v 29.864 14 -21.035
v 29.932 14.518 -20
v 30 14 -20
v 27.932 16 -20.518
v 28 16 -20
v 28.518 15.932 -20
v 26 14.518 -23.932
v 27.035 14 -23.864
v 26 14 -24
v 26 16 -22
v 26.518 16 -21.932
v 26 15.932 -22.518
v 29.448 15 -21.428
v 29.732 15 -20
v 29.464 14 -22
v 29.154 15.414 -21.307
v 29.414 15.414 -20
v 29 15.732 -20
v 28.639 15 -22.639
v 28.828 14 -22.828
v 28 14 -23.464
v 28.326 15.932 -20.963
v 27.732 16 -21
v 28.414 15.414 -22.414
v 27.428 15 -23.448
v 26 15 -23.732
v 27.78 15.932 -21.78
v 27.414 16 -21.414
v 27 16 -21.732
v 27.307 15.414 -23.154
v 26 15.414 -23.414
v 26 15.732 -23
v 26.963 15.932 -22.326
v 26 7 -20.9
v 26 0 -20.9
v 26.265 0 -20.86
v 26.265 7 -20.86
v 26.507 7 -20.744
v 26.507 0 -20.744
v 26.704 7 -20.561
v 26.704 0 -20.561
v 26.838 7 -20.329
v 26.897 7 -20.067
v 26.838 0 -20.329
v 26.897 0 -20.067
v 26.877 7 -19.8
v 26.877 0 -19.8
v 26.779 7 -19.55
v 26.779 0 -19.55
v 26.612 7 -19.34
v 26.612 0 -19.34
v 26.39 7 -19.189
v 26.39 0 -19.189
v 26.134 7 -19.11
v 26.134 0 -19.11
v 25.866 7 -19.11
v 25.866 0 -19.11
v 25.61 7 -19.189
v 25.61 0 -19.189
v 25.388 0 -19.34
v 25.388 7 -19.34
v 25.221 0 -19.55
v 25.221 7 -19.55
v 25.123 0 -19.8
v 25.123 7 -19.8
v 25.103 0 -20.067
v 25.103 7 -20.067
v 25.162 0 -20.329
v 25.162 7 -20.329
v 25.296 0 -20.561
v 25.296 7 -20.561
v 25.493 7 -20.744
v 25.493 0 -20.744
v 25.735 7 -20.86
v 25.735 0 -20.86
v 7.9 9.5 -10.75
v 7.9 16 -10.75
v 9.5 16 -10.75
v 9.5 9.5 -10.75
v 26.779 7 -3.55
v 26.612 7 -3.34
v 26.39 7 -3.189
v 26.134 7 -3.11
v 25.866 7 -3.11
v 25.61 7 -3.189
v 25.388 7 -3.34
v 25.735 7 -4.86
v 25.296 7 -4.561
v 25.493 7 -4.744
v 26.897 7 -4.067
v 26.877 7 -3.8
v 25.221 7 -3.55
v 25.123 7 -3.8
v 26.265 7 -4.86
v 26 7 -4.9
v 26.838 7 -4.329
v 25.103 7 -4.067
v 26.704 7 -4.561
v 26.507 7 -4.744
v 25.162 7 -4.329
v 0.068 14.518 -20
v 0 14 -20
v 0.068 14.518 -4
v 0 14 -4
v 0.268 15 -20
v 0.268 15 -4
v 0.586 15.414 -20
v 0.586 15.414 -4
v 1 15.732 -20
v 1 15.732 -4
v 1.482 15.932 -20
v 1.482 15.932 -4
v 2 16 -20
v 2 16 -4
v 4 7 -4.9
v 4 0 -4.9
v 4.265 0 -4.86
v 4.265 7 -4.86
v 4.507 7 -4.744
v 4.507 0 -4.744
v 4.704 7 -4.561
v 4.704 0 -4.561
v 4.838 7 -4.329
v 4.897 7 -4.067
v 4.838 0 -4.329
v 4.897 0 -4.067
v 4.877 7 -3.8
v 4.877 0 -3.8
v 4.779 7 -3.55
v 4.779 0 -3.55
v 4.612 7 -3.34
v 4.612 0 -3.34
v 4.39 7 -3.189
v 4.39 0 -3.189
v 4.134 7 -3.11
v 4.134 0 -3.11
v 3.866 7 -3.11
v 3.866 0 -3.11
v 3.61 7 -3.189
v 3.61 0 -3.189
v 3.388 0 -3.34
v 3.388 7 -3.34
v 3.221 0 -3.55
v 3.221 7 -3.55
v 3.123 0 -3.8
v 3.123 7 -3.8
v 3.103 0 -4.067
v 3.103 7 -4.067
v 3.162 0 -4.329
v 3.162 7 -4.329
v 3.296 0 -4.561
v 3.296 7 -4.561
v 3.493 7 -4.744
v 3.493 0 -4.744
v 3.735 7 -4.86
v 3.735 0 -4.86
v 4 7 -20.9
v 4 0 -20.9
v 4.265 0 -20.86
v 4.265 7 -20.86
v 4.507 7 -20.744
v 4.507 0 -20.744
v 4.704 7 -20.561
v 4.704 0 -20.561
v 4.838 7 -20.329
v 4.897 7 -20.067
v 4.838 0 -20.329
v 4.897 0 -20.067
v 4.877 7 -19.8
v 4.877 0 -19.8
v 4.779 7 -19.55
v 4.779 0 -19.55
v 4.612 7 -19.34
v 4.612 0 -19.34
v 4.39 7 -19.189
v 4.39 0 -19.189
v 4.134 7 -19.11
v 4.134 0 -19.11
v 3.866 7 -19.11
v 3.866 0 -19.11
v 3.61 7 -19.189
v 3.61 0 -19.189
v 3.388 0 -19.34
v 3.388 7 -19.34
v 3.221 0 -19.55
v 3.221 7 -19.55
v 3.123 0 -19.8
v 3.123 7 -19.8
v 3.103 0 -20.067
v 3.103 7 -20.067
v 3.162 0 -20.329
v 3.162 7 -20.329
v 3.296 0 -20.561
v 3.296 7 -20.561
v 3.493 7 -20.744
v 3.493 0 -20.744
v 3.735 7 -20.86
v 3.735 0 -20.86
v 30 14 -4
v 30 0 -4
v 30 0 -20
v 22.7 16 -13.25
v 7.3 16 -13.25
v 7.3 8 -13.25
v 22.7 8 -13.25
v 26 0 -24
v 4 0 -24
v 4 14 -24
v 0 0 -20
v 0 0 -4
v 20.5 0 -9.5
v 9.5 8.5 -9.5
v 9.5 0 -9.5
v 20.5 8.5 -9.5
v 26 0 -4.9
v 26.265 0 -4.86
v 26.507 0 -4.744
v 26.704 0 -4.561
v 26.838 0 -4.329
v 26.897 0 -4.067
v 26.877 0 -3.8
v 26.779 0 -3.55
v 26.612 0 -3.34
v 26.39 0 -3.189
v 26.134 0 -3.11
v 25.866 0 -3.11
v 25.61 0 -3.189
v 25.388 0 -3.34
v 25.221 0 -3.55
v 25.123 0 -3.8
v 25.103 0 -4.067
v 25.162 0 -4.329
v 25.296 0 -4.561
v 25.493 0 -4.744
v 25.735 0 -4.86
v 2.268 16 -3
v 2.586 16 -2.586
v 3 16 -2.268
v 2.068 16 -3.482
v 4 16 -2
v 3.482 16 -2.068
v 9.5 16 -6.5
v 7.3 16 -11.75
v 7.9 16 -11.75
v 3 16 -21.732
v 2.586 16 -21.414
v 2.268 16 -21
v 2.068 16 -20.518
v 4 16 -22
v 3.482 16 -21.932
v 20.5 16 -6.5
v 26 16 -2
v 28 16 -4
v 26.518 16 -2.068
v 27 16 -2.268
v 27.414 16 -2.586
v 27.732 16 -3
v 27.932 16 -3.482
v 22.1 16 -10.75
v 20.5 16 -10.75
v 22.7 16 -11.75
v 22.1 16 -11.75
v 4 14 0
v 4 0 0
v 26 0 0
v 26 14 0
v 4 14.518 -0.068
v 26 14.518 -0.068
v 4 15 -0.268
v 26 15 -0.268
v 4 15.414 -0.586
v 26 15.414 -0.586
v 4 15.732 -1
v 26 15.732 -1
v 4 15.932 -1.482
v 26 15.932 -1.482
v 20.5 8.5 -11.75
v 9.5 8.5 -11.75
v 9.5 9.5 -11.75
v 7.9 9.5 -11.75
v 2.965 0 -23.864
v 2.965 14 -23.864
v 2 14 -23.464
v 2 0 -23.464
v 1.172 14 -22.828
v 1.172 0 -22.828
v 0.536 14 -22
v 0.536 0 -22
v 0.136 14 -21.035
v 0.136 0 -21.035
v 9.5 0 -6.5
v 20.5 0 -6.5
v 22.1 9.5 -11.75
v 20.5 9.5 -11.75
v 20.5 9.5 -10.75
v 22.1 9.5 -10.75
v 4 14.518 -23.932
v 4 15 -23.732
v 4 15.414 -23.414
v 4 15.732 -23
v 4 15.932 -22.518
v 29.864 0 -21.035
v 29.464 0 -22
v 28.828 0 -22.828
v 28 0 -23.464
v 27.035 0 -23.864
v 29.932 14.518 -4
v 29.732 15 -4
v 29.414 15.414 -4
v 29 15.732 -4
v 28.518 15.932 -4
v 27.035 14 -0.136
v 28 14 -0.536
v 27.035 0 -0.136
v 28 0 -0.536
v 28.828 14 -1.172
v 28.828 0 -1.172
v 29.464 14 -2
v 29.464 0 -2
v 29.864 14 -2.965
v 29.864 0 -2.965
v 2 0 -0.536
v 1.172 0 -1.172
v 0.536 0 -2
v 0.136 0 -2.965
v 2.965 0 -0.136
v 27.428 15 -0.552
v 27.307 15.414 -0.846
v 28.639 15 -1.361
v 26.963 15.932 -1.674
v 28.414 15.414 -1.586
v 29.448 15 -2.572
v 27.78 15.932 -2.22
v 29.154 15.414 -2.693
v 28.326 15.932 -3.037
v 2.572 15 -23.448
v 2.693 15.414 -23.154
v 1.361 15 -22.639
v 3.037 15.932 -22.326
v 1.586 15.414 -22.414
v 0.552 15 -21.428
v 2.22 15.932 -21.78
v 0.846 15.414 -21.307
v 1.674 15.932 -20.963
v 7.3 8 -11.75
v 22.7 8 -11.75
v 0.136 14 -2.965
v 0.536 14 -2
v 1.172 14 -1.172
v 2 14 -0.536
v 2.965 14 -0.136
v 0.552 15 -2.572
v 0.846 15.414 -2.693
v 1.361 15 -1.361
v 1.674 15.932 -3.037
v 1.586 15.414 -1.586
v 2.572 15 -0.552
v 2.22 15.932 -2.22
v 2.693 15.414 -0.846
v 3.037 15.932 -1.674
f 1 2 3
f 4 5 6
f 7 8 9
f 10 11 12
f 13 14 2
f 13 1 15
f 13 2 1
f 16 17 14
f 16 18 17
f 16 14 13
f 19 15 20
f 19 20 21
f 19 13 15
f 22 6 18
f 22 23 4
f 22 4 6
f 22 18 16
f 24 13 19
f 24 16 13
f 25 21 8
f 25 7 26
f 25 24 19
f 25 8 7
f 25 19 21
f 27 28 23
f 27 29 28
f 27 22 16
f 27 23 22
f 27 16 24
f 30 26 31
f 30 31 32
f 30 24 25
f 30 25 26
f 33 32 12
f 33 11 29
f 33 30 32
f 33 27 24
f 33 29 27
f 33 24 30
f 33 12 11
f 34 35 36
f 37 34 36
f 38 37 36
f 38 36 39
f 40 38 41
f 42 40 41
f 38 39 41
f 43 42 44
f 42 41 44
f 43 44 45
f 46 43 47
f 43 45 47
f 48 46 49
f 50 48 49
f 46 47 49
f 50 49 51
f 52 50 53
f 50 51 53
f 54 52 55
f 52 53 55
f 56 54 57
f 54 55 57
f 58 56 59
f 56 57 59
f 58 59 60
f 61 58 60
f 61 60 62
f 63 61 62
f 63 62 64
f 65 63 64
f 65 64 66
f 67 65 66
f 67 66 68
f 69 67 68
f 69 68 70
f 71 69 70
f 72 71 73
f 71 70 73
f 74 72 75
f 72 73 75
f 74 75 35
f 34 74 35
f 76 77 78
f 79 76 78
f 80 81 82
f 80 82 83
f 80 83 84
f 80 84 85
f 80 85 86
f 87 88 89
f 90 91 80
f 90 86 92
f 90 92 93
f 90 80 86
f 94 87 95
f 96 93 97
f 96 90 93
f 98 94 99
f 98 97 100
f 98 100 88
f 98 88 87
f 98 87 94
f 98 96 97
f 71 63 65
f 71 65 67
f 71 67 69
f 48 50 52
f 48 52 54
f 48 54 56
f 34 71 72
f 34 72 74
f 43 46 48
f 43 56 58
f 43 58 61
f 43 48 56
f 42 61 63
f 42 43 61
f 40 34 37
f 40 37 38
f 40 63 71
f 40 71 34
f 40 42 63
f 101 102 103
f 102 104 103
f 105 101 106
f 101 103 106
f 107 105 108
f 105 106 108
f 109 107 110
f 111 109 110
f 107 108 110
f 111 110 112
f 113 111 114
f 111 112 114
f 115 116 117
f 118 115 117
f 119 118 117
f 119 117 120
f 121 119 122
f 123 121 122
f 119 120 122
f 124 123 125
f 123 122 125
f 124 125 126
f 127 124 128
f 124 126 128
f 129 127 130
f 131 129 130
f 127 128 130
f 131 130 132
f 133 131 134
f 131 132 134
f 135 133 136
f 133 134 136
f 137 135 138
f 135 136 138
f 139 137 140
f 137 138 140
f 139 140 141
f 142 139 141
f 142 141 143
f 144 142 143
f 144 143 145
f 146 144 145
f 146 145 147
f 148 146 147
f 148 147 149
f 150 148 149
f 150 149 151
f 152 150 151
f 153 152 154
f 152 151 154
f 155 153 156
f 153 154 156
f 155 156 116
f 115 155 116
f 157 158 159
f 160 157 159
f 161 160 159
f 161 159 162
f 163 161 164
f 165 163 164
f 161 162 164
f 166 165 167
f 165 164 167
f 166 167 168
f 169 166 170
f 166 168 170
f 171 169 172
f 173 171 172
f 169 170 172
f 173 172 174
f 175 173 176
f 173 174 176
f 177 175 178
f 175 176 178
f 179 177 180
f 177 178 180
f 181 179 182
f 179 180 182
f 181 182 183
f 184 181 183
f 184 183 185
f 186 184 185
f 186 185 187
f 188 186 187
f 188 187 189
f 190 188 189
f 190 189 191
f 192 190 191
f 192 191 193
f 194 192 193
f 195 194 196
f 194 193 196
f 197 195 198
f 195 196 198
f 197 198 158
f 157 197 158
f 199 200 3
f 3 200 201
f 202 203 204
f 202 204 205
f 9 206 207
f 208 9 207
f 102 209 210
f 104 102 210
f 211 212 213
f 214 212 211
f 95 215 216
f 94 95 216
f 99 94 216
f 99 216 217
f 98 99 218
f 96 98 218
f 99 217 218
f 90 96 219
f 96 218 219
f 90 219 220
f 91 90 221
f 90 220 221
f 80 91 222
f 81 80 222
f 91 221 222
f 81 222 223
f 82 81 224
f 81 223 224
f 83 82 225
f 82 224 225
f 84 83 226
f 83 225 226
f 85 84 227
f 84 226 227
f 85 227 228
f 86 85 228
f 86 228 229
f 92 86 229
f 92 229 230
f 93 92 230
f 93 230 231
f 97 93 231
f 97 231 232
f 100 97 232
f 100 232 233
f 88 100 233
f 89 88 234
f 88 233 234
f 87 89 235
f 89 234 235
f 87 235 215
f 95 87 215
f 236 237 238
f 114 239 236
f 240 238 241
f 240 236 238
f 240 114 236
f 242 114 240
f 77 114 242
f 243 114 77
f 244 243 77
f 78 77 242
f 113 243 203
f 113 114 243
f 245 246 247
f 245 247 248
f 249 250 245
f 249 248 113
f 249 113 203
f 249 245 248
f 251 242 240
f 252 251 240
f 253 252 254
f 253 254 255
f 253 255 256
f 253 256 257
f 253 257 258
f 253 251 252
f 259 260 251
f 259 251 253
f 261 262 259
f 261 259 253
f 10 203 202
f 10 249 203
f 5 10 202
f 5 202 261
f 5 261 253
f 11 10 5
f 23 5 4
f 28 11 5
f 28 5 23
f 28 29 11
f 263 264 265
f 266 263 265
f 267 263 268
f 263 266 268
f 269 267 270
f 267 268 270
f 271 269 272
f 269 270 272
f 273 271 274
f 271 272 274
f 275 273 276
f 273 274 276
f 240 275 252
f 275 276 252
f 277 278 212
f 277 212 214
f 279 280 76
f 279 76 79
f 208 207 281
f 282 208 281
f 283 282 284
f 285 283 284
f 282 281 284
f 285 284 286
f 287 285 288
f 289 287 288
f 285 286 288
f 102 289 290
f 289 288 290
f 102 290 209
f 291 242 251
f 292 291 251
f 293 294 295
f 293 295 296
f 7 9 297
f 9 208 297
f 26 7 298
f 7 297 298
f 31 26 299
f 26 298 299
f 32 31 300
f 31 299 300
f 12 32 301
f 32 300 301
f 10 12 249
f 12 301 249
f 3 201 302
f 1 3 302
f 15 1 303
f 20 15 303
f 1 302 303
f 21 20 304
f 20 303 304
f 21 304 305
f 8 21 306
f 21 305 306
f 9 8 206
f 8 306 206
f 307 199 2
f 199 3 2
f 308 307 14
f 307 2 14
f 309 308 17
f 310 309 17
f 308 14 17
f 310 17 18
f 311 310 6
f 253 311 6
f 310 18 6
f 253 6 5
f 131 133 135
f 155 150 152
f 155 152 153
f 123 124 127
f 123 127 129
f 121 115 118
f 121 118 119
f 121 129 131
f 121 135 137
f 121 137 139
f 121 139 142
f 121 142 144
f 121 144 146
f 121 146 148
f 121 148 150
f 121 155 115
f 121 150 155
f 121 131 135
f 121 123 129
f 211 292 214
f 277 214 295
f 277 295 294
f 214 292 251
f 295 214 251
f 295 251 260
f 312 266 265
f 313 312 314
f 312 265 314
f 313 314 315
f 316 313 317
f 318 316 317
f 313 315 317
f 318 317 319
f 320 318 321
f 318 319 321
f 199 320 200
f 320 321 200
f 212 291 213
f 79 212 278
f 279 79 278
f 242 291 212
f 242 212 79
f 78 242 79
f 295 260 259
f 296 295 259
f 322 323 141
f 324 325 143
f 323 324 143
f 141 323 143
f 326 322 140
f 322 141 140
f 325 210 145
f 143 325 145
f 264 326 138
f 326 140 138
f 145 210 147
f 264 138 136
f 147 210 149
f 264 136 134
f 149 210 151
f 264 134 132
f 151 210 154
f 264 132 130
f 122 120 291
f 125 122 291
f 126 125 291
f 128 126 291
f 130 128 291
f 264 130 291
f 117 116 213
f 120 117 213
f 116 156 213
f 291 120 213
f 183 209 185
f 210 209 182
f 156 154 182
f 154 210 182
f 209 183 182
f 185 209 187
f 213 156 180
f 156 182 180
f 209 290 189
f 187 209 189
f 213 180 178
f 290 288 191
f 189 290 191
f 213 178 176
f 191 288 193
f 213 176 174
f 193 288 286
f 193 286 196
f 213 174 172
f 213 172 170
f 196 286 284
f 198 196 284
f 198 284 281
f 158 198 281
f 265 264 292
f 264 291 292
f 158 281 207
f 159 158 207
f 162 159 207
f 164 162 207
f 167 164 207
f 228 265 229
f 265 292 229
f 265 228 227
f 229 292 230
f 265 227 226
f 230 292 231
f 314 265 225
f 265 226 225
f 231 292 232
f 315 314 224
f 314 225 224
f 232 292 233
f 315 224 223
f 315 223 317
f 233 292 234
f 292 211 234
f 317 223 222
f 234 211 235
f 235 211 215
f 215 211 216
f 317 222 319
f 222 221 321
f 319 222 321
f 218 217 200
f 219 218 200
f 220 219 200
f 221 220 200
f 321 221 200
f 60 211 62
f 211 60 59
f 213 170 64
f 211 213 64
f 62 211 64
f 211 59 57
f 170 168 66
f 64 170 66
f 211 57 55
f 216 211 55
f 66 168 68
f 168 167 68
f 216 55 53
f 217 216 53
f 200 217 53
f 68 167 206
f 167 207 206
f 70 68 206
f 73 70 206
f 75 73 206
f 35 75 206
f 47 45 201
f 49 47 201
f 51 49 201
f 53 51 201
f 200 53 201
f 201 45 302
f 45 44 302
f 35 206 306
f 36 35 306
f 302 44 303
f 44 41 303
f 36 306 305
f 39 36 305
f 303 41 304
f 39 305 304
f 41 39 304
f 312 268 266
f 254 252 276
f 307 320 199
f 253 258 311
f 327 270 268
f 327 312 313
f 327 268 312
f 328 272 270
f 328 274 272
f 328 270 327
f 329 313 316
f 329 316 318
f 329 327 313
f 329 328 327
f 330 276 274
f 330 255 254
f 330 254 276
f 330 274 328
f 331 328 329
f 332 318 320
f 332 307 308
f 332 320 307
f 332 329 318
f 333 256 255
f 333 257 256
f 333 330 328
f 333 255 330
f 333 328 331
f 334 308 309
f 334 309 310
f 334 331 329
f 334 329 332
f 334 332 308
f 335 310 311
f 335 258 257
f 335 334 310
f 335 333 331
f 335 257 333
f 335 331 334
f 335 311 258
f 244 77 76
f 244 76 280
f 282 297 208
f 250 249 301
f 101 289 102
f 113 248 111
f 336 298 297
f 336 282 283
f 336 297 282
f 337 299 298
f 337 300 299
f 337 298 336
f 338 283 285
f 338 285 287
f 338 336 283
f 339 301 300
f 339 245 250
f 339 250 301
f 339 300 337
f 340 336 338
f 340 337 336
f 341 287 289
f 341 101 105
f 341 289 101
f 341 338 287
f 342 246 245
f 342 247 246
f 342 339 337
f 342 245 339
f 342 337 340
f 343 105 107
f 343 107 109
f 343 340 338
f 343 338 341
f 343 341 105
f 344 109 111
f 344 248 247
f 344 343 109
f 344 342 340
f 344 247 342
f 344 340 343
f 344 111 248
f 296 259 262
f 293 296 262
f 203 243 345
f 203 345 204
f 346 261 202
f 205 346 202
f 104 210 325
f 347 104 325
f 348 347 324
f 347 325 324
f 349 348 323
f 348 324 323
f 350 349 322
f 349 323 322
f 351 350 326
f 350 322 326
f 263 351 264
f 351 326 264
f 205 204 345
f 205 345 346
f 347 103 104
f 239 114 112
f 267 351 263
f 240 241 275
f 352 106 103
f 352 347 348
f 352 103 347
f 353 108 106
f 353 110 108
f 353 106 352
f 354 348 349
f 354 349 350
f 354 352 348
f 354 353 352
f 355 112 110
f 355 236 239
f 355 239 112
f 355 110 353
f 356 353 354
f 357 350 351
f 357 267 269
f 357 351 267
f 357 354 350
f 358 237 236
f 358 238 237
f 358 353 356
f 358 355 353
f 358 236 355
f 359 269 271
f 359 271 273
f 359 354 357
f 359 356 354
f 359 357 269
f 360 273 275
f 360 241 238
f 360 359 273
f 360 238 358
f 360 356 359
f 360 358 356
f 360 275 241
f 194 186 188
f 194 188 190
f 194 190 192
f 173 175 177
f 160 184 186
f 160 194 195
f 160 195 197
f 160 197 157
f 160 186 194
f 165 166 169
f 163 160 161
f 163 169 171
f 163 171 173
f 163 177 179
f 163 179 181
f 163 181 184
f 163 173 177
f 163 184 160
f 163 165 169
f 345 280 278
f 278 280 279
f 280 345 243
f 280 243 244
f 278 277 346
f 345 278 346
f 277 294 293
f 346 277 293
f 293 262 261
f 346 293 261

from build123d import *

# Parameters (mm, degrees)
EXTRUDE_392_DEPTH      = 16
FILLET_1_R             = 2
SKETCH_6_R             = 0.9
CUT_EXTRUDE_1038_DEPTH = 7
CUT_EXTRUDE_1432_REACH = 43.617
SKETCH_3_W             = 11
SKETCH_3_H             = 3
SKETCH_2_W             = 15.4
SKETCH_2_H             = 1.5
CUT_EXTRUDE_1918_DEPTH = 8
SKETCH_7_W             = 11
SKETCH_7_H             = 2.25
CUT_EXTRUDE_2_DEPTH    = 7.5
SKETCH_8_W             = 14.2
SKETCH_8_H             = 1
CUT_EXTRUDE_3_DEPTH    = 6.5


with BuildPart() as part:
    # Эскиз1 → Extrude 392 (new body)
    with BuildSketch(Plane(origin=(0, 0, 0), x_dir=(1, 0, 0), z_dir=(0, 1, 0))):
        with BuildLine():
            Line((4, 0), (26, 0))
            ThreePointArc((26, 0), (28.828427125, 1.171572875), (30, 4))
            Line((30, 4), (30, 20))
            ThreePointArc((30, 20), (28.828427125, 22.828427125), (26, 24))
            Line((26, 24), (4, 24))
            ThreePointArc((4, 24), (1.171572875, 22.828427125), (0, 20))
            Line((0, 20), (0, 4))
            ThreePointArc((0, 4), (1.171572875, 1.171572875), (4, 0))
        make_face()
    extrude(amount=EXTRUDE_392_DEPTH)

    # Скругление1
    fillet_1_edges = [part.edges().sort_by_distance(p)[0] for p in [
        (1.171572875, 16, -22.828427125),
        (0, 16, -12),
        (1.171572875, 16, -1.171572875),
        (15, 16, 0),
        (28.828427125, 16, -1.171572875),
        (30, 16, -12),
        (28.828427125, 16, -22.828427125),
        (15, 16, -24),
    ]]
    fillet(fillet_1_edges, radius=FILLET_1_R)

    # Эскиз6 → Cut-Extrude 1038 (cut)
    with BuildSketch(Plane.XZ):
        with Locations(Location((4, -4, 0), (0, 0, 270))):
            Circle(SKETCH_6_R)
        with Locations(Location((26, -4, 0), (0, 0, 270))):
            Circle(SKETCH_6_R)
        with Locations(Location((26, -20, 0), (0, 0, 270))):
            Circle(SKETCH_6_R)
        with Locations(Location((4, -20, 0), (0, 0, 270))):
            Circle(SKETCH_6_R)
    extrude(amount=-CUT_EXTRUDE_1038_DEPTH, mode=Mode.SUBTRACT)

    # Эскиз3 → Cut-Extrude 1432 (cut, up to next)
    with BuildSketch(Plane(origin=(0, 16, 0), x_dir=(1, 0, 0), z_dir=(0, 1, 0)), mode=Mode.PRIVATE) as cut_extrude_1432_sk1:
        with Locations((15, 8)):
            Rectangle(SKETCH_3_W, SKETCH_3_H)
    cut_extrude_1432_tool1 = extrude(cut_extrude_1432_sk1.sketch, amount=-CUT_EXTRUDE_1432_REACH, mode=Mode.PRIVATE) & part.part
    add(cut_extrude_1432_tool1.solids().sort_by_distance((15, 16, -8))[0], mode=Mode.SUBTRACT)

    # Эскиз2 → Cut-Extrude 1918 (cut)
    with BuildSketch(Plane(origin=(0, 16, 0), x_dir=(1, 0, 0), z_dir=(0, 1, 0))):
        with Locations((15, 12.5)):
            Rectangle(SKETCH_2_W, SKETCH_2_H)
    extrude(amount=-CUT_EXTRUDE_1918_DEPTH, mode=Mode.SUBTRACT)

    # Эскиз7 → Вырез-Вытянуть2 (cut)
    with BuildSketch(Plane(origin=(0, 16, 0), x_dir=(1, 0, 0), z_dir=(0, 1, 0))):
        with Locations((15, 10.625)):
            Rectangle(SKETCH_7_W, SKETCH_7_H)
    extrude(amount=-CUT_EXTRUDE_2_DEPTH, mode=Mode.SUBTRACT)

    # Эскиз8 → Вырез-Вытянуть3 (cut)
    with BuildSketch(Plane(origin=(0, 16, 0), x_dir=(1, 0, 0), z_dir=(0, 1, 0))):
        with Locations((15, 11.25)):
            Rectangle(SKETCH_8_W, SKETCH_8_H)
    extrude(amount=-CUT_EXTRUDE_3_DEPTH, mode=Mode.SUBTRACT)


solid = part.part
